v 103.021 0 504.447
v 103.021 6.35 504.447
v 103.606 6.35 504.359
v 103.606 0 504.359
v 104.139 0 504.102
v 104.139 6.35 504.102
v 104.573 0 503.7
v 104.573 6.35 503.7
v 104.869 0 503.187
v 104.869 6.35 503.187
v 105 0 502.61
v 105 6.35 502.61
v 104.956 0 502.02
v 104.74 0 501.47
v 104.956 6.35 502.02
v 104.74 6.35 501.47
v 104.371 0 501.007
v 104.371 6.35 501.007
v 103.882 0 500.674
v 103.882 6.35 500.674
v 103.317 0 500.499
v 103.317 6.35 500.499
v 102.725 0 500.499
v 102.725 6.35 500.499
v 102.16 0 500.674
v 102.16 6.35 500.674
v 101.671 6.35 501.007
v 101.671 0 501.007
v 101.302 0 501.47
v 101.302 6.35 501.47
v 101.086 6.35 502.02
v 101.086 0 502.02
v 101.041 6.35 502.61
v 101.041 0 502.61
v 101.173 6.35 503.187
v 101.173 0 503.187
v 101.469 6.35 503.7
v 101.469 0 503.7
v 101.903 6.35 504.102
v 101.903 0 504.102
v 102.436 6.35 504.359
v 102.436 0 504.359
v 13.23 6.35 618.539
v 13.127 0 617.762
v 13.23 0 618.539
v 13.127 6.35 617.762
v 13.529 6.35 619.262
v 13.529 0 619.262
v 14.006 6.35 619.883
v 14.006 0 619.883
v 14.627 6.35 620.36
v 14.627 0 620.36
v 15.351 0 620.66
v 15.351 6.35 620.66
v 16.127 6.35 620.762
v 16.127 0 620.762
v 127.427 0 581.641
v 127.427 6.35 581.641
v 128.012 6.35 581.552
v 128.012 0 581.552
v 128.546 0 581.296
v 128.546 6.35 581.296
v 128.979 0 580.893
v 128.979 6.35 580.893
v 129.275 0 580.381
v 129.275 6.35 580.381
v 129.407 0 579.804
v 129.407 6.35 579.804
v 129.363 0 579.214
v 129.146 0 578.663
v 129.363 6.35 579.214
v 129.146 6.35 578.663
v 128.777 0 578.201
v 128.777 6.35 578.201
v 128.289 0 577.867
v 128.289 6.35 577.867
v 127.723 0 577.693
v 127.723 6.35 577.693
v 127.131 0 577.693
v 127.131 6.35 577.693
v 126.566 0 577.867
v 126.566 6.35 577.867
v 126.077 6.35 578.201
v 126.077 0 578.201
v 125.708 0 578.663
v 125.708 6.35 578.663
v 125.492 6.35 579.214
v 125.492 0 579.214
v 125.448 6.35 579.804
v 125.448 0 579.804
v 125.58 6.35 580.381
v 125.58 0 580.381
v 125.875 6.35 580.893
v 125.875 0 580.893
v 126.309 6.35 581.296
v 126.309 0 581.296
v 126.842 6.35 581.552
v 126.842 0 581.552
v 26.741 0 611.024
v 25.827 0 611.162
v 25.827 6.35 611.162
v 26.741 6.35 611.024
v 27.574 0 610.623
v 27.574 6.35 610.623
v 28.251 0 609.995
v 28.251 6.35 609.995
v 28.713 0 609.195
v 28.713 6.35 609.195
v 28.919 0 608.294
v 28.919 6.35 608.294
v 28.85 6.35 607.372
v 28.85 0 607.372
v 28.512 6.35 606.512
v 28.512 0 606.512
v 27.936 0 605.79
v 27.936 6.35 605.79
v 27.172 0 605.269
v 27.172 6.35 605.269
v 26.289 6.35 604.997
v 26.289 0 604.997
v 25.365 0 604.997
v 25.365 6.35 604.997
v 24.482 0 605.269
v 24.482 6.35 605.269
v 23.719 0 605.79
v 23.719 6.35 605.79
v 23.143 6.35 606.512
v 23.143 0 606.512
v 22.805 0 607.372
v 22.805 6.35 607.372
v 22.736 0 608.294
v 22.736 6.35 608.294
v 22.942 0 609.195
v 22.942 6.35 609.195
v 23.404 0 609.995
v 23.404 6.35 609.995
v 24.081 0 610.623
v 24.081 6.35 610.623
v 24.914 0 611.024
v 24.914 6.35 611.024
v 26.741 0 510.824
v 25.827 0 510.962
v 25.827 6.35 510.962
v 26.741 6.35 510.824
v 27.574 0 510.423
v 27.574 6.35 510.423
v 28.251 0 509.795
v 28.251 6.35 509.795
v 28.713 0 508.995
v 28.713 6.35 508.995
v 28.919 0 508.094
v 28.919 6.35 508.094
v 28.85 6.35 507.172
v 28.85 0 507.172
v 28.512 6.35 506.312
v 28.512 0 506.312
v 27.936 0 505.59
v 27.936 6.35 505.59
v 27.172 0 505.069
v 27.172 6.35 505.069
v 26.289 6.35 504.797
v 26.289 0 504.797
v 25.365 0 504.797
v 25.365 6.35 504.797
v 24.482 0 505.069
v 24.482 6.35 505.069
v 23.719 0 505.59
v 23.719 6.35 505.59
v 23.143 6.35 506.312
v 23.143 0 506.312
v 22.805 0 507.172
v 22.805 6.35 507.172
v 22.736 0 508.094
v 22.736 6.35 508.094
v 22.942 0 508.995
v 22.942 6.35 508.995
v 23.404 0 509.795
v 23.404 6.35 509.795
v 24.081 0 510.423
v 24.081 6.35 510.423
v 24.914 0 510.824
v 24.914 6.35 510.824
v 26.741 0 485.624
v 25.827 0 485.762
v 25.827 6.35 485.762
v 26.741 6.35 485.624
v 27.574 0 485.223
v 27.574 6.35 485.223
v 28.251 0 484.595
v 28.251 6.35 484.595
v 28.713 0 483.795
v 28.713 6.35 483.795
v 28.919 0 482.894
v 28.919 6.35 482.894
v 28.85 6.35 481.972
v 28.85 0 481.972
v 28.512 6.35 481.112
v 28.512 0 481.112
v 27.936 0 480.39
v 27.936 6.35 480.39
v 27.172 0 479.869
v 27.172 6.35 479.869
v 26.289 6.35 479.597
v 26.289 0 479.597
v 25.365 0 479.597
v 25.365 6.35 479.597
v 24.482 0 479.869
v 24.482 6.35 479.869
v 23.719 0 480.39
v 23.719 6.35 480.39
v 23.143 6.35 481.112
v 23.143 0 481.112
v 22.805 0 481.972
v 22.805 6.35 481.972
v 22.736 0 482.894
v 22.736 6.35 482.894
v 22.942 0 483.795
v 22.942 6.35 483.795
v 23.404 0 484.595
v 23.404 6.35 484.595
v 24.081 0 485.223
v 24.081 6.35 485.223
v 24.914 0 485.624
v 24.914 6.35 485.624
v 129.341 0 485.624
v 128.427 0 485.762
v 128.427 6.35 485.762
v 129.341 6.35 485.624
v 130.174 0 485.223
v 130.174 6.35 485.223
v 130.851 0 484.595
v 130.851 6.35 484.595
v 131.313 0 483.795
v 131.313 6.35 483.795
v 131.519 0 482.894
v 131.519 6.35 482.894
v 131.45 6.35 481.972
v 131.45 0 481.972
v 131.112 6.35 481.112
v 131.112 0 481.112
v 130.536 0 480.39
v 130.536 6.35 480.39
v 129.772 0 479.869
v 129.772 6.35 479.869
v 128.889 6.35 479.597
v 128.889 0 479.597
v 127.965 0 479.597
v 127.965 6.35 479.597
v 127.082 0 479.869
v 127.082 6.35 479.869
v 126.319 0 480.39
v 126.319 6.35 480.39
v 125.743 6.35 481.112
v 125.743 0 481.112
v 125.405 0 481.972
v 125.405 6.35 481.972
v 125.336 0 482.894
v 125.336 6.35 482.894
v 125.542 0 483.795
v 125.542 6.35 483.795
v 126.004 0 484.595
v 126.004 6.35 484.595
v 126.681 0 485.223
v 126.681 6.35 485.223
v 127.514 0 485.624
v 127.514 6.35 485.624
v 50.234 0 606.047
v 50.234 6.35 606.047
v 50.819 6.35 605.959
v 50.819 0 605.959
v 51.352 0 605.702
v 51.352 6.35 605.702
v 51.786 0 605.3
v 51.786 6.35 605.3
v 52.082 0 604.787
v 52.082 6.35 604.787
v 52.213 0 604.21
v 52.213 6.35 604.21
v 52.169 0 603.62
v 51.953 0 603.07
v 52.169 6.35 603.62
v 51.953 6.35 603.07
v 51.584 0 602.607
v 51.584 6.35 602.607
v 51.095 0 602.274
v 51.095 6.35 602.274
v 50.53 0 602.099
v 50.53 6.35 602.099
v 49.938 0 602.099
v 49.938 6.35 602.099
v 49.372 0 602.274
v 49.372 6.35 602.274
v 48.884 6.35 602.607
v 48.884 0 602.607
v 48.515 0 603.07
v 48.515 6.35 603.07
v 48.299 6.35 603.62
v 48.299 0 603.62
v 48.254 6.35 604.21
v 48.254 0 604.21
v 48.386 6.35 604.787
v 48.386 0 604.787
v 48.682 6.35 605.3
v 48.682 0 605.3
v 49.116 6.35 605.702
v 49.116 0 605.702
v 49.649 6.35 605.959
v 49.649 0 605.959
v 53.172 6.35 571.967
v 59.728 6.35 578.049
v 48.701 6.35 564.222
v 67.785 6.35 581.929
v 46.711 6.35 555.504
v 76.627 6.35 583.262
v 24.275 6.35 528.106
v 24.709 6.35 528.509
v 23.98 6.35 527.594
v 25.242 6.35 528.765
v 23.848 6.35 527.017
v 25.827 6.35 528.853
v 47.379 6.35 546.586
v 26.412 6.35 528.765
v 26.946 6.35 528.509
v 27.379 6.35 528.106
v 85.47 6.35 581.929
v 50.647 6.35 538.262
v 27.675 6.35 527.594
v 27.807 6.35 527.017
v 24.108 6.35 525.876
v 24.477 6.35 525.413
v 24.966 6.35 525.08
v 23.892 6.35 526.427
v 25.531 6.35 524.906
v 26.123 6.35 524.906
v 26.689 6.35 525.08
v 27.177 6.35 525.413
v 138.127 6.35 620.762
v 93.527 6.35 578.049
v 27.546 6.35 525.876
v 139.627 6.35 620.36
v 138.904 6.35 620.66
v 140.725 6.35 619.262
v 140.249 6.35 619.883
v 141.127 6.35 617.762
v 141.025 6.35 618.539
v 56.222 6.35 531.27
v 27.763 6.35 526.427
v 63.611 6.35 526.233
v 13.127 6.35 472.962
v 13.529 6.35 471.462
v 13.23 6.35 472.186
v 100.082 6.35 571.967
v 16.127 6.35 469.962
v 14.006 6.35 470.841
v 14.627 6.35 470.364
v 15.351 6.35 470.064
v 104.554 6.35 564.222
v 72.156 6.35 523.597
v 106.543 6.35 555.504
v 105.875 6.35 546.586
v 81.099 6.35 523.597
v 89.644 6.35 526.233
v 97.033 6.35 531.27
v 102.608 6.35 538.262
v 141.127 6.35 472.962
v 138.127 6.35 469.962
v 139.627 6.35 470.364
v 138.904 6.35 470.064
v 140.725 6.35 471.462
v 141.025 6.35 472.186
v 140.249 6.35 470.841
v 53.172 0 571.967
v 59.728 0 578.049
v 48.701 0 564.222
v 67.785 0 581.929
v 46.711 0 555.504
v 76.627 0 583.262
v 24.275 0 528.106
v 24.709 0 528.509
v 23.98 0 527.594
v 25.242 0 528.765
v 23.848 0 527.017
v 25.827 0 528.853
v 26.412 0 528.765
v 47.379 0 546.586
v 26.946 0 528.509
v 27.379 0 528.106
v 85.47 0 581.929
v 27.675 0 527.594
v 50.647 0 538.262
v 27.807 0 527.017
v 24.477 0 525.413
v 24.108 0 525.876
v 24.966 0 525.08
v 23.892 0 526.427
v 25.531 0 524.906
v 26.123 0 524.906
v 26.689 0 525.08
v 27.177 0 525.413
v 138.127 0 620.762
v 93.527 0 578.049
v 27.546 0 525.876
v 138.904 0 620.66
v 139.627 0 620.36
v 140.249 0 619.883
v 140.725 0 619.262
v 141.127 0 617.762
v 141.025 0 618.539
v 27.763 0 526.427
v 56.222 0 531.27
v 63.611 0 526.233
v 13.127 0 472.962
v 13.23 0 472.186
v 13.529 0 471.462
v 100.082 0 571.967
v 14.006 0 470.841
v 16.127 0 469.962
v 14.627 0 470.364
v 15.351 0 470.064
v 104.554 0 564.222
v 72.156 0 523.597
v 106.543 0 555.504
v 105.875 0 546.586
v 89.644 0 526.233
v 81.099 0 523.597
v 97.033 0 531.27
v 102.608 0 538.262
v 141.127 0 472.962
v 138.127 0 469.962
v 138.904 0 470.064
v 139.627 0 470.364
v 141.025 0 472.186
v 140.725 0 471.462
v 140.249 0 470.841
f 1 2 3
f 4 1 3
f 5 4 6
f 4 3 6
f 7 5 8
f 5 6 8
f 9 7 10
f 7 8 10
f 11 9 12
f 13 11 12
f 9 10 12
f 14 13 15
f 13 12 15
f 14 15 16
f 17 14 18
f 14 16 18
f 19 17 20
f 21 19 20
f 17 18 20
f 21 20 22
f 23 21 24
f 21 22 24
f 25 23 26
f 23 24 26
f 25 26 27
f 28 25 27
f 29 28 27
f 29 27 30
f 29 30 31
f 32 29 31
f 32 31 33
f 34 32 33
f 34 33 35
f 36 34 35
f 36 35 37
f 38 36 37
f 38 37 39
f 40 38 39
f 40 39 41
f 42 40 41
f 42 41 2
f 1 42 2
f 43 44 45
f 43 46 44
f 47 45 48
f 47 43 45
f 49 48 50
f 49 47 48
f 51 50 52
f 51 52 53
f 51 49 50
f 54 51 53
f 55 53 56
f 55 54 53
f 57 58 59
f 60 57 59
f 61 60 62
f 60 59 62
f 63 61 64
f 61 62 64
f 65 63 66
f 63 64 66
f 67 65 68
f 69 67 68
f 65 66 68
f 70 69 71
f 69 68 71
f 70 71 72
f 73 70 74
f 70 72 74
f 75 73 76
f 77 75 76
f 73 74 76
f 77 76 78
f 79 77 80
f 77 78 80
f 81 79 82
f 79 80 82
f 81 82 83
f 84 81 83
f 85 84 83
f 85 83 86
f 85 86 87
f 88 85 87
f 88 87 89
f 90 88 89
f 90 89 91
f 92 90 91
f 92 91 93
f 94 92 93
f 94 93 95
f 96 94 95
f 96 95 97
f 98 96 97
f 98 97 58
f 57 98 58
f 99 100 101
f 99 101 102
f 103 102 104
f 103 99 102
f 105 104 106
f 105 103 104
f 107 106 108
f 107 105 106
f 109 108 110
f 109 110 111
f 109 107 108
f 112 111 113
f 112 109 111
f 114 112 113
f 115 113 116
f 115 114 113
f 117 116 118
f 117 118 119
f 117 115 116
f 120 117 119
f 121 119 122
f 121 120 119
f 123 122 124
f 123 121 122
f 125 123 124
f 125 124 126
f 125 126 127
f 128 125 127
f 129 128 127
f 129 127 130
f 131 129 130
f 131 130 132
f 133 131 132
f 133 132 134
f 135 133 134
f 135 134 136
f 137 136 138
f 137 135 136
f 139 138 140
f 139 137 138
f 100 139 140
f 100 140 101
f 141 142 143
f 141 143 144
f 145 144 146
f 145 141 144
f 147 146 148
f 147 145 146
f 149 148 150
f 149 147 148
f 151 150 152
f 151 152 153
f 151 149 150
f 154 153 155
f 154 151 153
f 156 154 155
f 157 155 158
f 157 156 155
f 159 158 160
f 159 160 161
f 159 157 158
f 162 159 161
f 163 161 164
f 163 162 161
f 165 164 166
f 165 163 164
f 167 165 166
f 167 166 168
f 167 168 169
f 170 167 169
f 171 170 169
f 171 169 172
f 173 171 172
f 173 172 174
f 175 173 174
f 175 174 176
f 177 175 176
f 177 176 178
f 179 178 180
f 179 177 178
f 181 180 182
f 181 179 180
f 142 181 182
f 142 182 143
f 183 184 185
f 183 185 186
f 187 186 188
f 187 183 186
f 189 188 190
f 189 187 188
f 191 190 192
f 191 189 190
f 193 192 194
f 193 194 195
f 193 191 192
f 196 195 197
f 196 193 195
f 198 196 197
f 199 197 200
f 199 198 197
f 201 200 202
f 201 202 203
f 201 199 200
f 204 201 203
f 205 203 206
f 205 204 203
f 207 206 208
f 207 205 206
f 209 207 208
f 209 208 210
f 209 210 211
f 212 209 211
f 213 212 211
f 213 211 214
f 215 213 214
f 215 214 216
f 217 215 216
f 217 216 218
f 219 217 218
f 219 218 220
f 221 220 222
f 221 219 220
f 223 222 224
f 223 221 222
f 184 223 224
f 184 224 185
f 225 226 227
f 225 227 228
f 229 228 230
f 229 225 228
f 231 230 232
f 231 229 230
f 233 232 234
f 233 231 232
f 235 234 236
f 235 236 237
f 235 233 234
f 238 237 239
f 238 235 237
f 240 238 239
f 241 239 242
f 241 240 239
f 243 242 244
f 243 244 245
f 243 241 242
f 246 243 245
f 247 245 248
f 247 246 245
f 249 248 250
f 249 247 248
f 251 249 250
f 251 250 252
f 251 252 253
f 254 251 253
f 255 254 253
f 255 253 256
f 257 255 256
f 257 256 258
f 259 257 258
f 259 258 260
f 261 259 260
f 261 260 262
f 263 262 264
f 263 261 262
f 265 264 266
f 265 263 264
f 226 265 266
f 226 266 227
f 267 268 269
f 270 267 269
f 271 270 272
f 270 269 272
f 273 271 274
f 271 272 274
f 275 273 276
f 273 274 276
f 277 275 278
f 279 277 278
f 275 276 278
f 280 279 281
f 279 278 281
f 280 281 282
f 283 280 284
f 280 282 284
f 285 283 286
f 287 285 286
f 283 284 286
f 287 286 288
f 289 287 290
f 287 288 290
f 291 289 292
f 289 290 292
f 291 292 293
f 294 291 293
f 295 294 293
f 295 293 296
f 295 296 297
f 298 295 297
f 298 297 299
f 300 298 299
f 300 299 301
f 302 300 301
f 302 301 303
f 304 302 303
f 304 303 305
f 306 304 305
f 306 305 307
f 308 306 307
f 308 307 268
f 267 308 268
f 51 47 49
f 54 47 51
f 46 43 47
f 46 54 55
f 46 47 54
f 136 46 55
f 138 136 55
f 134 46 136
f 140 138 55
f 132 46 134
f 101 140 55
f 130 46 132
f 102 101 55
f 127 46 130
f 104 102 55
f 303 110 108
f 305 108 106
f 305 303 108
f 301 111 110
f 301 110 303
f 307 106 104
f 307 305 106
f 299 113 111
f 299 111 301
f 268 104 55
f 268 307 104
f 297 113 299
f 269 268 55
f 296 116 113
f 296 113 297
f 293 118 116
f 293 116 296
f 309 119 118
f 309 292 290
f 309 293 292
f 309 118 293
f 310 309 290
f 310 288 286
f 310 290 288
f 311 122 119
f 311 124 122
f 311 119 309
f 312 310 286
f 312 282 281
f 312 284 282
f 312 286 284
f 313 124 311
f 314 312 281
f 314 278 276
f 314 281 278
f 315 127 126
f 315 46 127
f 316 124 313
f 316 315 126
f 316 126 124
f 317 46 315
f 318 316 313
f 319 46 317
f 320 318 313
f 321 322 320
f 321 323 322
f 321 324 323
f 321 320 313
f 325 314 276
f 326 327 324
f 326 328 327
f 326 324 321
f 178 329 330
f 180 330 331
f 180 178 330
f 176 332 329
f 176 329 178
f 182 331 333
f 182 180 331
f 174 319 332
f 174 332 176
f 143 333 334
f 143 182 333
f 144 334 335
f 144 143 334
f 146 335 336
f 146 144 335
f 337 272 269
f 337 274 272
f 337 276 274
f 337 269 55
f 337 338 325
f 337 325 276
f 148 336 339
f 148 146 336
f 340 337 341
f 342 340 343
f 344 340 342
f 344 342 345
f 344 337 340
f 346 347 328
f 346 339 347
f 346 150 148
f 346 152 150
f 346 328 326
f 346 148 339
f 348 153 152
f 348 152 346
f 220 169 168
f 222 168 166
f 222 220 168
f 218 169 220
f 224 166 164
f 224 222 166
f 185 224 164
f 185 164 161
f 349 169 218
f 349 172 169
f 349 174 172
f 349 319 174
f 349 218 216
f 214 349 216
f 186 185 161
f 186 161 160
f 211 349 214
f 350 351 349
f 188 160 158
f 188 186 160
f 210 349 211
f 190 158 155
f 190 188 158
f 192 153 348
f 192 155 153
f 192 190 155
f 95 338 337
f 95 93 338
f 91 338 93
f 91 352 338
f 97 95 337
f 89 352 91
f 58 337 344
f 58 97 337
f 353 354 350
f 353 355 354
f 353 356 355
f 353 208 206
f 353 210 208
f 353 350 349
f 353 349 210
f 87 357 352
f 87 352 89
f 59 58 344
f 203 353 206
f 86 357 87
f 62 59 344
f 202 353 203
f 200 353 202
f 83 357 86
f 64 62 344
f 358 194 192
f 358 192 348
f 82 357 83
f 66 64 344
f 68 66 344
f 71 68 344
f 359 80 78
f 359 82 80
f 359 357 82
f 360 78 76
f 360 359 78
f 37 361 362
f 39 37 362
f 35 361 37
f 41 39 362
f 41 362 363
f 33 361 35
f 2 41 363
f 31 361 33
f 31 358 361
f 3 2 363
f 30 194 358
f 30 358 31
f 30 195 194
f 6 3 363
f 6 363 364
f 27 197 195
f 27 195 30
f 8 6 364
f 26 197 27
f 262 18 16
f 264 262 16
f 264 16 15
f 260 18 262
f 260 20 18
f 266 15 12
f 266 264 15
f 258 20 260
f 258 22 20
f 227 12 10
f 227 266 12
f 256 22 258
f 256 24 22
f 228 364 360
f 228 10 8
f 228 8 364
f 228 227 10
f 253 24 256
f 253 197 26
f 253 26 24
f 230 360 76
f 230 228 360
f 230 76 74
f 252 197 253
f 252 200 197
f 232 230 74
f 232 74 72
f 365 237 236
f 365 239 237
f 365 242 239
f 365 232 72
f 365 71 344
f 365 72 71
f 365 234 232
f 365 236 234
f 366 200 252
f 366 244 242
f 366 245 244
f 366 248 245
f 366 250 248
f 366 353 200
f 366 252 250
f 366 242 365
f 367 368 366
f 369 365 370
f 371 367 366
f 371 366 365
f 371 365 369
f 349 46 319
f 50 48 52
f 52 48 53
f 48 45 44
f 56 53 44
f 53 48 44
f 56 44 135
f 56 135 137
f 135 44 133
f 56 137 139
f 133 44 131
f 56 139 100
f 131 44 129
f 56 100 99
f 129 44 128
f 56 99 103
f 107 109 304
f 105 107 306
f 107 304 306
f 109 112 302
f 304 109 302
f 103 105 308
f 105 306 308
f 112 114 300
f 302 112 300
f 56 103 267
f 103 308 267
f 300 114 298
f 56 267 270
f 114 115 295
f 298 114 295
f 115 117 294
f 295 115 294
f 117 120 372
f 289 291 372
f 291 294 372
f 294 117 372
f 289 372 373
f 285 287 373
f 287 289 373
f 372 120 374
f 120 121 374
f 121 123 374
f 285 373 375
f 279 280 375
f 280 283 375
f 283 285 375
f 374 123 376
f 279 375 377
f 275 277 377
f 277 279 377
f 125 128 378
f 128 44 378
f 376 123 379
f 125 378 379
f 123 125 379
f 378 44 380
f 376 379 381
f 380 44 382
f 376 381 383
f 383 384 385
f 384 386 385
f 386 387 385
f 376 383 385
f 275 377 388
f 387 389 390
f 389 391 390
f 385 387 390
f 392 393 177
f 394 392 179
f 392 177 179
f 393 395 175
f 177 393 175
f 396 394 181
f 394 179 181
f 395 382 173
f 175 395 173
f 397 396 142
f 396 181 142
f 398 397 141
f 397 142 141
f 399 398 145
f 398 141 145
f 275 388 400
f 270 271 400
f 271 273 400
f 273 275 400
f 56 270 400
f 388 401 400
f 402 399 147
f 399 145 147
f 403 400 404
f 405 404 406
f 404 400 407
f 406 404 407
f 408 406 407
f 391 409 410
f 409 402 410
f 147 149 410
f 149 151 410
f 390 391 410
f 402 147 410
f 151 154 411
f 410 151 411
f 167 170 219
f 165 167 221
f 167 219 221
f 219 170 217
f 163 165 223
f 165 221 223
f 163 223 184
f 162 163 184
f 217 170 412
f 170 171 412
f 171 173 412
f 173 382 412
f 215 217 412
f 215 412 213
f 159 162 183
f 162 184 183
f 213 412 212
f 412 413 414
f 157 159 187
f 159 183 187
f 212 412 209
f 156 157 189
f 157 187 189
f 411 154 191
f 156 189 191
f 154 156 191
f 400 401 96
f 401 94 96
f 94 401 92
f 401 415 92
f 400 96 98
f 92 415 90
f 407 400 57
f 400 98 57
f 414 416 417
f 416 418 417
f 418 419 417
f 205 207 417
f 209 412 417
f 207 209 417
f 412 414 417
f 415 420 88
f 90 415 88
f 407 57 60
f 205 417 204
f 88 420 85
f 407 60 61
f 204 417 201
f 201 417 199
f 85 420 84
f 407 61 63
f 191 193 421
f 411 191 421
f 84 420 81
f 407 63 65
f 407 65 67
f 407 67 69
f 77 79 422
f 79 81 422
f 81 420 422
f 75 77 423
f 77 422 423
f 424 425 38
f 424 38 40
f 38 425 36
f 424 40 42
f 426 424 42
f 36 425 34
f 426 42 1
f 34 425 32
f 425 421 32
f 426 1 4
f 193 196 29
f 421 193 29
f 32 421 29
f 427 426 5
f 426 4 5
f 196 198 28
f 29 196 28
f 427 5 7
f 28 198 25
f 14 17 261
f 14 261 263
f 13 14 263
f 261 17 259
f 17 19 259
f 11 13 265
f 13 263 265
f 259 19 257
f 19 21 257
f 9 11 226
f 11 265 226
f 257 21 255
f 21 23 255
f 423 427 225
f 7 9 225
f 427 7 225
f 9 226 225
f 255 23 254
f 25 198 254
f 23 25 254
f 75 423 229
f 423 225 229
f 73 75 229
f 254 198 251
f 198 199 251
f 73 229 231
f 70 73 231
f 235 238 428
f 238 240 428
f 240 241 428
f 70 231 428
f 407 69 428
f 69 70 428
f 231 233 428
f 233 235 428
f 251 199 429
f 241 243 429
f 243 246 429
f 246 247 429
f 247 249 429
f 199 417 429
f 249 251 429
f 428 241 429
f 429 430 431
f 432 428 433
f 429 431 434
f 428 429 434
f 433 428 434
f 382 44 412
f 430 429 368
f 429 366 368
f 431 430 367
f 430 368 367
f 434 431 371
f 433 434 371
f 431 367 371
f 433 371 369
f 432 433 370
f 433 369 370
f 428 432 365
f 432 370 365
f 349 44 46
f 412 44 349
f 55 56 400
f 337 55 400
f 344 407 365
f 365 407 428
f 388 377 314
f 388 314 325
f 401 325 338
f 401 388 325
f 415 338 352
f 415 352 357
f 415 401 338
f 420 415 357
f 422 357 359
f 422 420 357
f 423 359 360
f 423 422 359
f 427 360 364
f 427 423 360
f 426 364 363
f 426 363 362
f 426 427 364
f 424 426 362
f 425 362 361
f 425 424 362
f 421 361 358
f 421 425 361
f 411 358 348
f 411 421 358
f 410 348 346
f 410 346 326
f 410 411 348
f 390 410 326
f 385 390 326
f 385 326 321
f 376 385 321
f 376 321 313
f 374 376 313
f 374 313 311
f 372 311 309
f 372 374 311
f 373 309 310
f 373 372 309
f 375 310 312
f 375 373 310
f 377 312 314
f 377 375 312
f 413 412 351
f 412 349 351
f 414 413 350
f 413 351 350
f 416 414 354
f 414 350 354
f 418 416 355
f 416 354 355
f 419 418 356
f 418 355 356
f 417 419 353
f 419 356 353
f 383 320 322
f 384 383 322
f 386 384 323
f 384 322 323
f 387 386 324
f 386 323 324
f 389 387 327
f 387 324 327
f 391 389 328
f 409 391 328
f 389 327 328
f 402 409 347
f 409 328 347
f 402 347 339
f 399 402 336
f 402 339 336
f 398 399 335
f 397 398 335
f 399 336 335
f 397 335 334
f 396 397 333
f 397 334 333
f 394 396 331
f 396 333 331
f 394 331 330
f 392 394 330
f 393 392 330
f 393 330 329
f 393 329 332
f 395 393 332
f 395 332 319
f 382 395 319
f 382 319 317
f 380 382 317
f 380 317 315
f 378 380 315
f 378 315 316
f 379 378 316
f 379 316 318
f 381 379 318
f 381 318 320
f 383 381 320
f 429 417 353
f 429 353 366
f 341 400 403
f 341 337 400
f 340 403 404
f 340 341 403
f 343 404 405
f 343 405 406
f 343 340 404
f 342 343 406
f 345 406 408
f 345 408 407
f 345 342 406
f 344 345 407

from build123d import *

# Parameters (mm, degrees)
SKETCH1_W           = 128
SKETCH1_H           = 150.8
SKETCH1_R           = 30
SKETCH1_R_2         = 3.1
BOSS_EXTRUDE1_DEPTH = 6.35
FILLET1_R           = 3
SKETCH3_R           = 1.985
CUT_EXTRUDE1_DEPTH  = 637.633938538


with BuildPart() as part:
    # Sketch1 → Boss-Extrude1 (new body)
    with BuildSketch(Plane(origin=(0, 0, 0), x_dir=(1, 0, 0), z_dir=(0, 1, 0))):
        with Locations((77.127334094, -545.362051651)):
            Rectangle(SKETCH1_W, SKETCH1_H)
        with Locations(Location((76.627334094, -553.262051651, 0), (0, 0, 270))):
            Circle(SKETCH1_R, mode=Mode.SUBTRACT)
        with Locations(Location((25.827334094, -482.662051651, 0), (0, 0, 270))):
            Circle(SKETCH1_R_2, mode=Mode.SUBTRACT)
        with Locations(Location((128.427334094, -482.662051651, 0), (0, 0, 270))):
            Circle(SKETCH1_R_2, mode=Mode.SUBTRACT)
        with Locations(Location((25.827334094, -608.062051651, 0), (0, 0, 270))):
            Circle(SKETCH1_R_2, mode=Mode.SUBTRACT)
        with Locations(Location((25.827334094, -507.862051651, 0), (0, 0, 270))):
            Circle(SKETCH1_R_2, mode=Mode.SUBTRACT)
    extrude(amount=BOSS_EXTRUDE1_DEPTH)

    # Fillet1
    fillet1_edges = [part.edges().sort_by_distance(p)[0] for p in [
        (141.127334094, 3.175, 620.762051651),
        (13.127334094, 3.175, 620.762051651),
        (13.127334094, 3.175, 469.962051651),
        (141.127334094, 3.175, 469.962051651),
    ]]
    fillet(fillet1_edges, radius=FILLET1_R)

    # Sketch3 → Cut-Extrude1 (cut, through all)
    with BuildSketch(Plane(origin=(0, 6.35, 0), x_dir=(1, 0, 0), z_dir=(0, 1, 0))):
        with Locations(Location((25.827334094, -526.868476675, 0), (0, 0, 270))):
            Circle(SKETCH3_R)
        with Locations(Location((103.020909069, -502.462051651, 0), (0, 0, 270))):
            Circle(SKETCH3_R)
        with Locations(Location((127.427334094, -579.655626627, 0), (0, 0, 270))):
            Circle(SKETCH3_R)
        with Locations(Location((50.233759118, -604.062051651, 0), (0, 0, 270))):
            Circle(SKETCH3_R)
    extrude(amount=-CUT_EXTRUDE1_DEPTH, mode=Mode.SUBTRACT)


solid = part.part
